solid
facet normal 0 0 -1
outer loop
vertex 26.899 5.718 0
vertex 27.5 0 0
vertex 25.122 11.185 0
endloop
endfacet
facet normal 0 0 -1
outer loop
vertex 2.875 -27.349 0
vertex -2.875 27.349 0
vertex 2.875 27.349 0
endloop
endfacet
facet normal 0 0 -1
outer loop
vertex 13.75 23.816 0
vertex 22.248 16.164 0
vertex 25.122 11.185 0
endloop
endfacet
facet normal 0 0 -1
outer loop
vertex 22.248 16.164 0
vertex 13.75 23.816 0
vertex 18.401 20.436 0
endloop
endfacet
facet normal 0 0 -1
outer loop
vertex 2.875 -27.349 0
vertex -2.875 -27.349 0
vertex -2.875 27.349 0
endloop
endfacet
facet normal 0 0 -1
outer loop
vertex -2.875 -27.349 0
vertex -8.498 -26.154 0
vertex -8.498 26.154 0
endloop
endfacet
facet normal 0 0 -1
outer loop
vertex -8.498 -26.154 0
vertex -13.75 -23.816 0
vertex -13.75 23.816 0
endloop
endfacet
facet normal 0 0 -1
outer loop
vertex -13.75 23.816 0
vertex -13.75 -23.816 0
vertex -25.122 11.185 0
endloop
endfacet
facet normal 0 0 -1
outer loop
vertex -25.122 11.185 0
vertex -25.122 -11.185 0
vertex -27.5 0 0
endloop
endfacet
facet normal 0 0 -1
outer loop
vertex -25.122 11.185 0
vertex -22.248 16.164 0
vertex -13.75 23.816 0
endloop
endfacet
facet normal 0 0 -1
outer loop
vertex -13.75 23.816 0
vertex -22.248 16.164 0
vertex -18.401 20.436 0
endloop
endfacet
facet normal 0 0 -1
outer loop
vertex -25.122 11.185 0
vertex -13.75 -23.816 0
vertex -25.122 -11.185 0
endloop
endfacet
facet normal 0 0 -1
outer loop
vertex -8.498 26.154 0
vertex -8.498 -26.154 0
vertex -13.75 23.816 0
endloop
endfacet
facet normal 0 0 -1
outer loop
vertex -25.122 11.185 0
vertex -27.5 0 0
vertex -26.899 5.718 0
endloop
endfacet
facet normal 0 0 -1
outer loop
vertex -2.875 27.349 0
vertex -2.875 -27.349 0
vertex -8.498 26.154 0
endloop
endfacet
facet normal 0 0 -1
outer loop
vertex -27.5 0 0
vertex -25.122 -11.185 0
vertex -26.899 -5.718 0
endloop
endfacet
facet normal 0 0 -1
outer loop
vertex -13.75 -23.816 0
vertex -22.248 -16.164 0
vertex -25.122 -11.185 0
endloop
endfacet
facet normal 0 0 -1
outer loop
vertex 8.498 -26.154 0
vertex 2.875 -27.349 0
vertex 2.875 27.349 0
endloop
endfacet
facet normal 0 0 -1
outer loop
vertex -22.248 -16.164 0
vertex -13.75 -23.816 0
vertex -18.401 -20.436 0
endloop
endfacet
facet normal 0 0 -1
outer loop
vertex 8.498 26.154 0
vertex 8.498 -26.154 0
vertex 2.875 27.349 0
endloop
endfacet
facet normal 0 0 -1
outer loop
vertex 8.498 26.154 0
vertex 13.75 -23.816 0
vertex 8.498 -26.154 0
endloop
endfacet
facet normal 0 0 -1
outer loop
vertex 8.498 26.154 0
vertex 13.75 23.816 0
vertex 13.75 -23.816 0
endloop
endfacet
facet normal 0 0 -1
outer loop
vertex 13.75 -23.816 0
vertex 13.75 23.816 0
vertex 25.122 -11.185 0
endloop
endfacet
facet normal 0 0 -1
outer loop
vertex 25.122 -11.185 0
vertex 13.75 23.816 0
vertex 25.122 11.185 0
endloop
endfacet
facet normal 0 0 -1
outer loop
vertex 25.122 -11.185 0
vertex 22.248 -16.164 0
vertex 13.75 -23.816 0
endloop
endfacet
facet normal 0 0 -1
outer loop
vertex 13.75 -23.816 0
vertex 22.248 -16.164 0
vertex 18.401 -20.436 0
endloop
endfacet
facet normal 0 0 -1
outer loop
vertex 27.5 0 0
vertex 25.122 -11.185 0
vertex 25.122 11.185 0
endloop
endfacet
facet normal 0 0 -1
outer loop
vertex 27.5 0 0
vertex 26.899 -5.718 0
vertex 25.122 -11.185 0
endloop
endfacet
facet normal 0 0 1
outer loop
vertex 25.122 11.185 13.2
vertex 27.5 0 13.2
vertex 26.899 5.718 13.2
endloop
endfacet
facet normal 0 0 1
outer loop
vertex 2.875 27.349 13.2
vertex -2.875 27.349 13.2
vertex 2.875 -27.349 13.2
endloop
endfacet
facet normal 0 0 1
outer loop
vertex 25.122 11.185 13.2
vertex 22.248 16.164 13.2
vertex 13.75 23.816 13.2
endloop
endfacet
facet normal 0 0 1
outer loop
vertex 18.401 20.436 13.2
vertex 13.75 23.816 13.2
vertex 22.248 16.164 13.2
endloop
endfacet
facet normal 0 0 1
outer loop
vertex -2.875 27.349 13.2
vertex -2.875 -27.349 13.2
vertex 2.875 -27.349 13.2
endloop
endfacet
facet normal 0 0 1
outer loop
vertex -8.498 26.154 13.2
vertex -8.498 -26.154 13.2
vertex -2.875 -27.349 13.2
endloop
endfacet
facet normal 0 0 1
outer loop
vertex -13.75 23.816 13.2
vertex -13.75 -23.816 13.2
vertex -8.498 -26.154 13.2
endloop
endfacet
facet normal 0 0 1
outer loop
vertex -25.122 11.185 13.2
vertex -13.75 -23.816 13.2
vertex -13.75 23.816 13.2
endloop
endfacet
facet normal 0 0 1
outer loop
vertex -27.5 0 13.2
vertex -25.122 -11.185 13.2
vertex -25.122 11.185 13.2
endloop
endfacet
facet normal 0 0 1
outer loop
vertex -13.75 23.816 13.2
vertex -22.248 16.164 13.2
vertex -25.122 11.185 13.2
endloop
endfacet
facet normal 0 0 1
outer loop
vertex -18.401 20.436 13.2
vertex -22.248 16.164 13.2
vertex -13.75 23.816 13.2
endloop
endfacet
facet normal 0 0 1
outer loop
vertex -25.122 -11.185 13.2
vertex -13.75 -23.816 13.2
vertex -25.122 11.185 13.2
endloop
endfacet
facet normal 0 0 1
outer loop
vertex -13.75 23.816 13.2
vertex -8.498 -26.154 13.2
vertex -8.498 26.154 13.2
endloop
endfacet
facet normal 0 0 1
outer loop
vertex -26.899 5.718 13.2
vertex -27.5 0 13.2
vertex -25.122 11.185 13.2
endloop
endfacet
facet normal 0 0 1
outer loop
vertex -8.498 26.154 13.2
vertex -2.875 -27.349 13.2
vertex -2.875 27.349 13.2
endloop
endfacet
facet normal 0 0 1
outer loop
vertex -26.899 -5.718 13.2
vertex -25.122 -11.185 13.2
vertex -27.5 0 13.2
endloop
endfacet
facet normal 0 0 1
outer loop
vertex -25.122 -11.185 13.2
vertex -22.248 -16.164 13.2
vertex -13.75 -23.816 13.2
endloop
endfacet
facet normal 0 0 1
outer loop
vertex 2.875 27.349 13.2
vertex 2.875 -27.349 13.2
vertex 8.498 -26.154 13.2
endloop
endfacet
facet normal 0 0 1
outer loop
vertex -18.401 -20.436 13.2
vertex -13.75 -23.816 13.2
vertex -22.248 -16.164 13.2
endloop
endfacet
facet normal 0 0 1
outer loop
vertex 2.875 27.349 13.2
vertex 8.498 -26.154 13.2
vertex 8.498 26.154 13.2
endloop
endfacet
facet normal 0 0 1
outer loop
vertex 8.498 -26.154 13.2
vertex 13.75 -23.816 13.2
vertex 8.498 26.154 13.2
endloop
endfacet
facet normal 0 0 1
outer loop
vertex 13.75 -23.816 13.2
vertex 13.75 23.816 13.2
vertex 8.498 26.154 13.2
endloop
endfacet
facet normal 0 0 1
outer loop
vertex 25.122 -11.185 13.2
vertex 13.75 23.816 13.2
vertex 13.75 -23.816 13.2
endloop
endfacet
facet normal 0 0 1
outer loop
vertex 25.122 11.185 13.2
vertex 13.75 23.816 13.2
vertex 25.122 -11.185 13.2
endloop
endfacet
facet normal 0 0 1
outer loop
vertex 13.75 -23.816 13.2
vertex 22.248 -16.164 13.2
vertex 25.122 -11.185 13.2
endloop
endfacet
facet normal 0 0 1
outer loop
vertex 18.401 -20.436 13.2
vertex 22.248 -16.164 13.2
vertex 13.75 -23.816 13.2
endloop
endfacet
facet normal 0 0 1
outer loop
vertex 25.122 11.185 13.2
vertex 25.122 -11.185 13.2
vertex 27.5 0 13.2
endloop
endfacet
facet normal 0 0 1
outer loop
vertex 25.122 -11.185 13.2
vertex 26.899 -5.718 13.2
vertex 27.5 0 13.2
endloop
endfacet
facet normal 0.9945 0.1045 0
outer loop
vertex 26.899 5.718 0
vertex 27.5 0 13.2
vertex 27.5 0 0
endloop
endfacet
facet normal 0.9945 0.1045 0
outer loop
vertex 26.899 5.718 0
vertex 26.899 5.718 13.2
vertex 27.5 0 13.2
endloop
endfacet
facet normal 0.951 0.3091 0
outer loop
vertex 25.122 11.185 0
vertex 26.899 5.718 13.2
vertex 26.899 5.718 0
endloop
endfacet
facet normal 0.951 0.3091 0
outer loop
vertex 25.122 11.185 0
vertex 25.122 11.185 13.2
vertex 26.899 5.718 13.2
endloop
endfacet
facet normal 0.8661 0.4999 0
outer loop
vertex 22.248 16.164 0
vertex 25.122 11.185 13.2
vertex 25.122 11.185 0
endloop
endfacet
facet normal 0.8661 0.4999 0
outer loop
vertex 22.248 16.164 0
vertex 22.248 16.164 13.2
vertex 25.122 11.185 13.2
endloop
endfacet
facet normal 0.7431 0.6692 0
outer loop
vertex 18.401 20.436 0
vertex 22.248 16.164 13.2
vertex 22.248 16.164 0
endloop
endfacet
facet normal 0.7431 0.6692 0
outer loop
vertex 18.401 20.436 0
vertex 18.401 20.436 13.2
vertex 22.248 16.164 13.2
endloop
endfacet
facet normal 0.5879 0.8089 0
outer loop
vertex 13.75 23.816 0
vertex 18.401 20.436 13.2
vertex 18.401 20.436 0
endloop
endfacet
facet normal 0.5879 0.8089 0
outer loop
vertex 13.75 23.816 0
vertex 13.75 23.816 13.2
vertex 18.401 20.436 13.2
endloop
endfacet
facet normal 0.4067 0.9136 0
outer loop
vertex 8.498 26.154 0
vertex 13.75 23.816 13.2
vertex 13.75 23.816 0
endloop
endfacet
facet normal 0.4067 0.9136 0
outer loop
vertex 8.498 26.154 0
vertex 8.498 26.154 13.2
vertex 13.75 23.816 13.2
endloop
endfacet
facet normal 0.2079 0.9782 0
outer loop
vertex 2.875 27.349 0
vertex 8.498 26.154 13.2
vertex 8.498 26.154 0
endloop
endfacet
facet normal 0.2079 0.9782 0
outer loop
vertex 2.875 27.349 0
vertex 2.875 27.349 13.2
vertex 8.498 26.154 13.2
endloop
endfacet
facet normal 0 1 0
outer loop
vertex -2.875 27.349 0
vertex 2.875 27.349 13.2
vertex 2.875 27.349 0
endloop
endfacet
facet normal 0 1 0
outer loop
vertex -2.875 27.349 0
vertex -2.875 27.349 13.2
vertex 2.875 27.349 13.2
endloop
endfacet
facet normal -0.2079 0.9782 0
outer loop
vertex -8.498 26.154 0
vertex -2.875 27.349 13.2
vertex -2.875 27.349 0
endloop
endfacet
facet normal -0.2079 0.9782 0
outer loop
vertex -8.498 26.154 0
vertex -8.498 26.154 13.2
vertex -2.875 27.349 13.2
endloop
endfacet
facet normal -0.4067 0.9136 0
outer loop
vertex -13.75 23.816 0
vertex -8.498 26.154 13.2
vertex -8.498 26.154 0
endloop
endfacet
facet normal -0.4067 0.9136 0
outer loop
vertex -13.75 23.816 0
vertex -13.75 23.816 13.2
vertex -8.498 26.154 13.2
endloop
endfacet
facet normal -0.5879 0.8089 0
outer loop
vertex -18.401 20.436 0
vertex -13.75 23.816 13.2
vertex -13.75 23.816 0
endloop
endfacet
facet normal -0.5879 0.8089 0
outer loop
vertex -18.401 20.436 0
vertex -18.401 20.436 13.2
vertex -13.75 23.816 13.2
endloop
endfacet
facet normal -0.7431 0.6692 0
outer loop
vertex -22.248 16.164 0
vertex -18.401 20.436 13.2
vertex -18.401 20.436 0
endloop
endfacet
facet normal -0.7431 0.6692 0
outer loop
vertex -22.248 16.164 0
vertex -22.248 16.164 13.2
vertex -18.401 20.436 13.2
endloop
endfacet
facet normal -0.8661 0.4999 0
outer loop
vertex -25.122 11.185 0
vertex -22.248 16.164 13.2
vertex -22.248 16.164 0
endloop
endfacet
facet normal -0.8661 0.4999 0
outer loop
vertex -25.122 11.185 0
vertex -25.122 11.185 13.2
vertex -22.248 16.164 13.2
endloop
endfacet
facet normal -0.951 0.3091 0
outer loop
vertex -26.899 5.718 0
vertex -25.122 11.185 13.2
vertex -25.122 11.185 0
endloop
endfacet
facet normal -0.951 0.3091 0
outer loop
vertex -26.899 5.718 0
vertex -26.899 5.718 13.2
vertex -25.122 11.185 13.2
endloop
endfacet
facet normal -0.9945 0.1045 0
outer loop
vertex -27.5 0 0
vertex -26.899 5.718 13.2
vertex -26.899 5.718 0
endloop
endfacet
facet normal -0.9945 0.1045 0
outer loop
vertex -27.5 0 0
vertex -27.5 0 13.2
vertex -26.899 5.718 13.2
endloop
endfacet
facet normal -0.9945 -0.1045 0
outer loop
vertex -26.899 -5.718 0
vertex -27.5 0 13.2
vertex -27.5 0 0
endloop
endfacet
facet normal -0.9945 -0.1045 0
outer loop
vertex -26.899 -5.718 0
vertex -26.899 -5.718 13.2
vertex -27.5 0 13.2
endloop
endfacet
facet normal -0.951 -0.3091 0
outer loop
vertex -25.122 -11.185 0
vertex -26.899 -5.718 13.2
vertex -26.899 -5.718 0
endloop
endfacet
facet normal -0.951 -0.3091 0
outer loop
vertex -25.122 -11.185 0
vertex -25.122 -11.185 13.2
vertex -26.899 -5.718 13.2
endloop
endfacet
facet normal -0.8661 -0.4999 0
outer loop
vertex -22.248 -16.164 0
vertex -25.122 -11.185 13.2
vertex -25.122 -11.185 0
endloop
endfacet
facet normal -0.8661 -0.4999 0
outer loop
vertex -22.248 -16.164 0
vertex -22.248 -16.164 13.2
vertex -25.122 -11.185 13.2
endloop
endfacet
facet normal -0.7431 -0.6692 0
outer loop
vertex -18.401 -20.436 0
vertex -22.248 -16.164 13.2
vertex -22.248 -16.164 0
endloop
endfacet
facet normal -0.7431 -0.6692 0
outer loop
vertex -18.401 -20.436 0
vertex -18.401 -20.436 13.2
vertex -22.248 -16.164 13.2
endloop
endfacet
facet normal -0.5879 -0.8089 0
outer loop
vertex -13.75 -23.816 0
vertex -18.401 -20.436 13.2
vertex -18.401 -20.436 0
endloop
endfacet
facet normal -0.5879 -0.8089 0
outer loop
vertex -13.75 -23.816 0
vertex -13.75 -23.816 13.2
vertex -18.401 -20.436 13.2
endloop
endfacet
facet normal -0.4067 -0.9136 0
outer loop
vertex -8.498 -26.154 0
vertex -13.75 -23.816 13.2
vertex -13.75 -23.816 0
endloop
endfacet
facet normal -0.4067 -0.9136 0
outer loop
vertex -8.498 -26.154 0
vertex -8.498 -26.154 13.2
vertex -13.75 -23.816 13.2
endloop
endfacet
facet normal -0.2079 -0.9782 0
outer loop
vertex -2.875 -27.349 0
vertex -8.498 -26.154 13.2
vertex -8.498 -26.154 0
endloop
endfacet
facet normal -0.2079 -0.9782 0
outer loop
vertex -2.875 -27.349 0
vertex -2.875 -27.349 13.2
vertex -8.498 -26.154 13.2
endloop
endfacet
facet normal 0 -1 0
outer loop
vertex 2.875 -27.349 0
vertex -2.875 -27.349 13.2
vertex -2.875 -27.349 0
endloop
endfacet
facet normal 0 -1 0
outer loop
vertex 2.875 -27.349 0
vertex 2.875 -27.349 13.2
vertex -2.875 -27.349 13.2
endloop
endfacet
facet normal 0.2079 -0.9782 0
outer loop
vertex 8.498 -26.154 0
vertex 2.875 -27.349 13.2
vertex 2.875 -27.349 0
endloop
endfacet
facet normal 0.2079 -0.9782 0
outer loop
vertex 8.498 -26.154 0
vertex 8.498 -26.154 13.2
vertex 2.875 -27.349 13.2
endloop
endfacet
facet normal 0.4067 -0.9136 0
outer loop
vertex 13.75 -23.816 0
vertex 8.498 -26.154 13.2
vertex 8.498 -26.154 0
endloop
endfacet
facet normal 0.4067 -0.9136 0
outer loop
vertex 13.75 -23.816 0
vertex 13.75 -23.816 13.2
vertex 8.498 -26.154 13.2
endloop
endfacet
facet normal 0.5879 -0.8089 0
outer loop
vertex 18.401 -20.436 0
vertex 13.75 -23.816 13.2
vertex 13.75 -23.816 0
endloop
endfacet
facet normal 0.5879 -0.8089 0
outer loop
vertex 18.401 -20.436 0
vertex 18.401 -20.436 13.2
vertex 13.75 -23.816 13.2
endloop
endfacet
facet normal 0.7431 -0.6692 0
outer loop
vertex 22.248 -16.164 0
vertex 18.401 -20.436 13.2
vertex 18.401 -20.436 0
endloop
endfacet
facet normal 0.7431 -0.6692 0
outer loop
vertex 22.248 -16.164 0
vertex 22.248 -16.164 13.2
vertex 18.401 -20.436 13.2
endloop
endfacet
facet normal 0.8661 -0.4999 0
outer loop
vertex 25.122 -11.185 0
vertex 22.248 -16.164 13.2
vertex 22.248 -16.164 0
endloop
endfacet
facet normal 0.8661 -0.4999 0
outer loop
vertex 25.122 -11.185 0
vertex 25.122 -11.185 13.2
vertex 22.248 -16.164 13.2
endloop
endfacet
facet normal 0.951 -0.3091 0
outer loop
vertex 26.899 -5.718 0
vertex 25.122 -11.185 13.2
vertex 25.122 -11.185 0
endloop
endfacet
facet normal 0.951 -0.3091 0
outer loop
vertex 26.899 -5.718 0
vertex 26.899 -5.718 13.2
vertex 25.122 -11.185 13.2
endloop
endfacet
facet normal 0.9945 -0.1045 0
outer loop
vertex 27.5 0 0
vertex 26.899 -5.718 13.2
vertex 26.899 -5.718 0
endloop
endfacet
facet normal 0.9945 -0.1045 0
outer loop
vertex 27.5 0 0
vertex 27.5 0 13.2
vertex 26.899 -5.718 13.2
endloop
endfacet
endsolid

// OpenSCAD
//Created by Ari M. Diacou, June 2015
//Shared under Creative Commons License: Attribution 3.0 Unported (CC BY-SA 3.0) 
//see http://creativecommons.org/licenses/by-sa/3.0/

/* [Base] */
//How many blocks form a circle?
blocks_per_rev=12;
//Number of layers of blocks in the turret base
blocks_high=3;
//The height of each block in mm
block_height=4;
//The radial width of a block in mm
block_thickness=10;
//The width of the turret in mm
turret_diameter=60;
//How far the mortar extends from the inside of the blocks in units of block thickness. Range 0-1.
mortar_thickness=.5;
//The type of block being used
stone_type="rough";//["rough","smooth"]
//<1 Compresses layers, >1 expands them to show mortar
z_spacing=1.1;
//<1 Compresses layers, >1 expands them to show mortar
theta_expansion=.95;

/* [Rough Stone Options] */
//A way to save your "random" arrangement
master_seed=1;
//Number of intersections forming a block
n=8;
//reduces the ablity of higher n to cut away all the block, I like -0.4.
power=-.4; //[-1,-0.9,-0.8,-0.7,-0.6,-0.5,-0.4,-0.3,-0.2,-0.1,0]
//Maximum angle of block intersections
max_angle=20;

/* [Smooth Stone Options] */
//How much curviness do you want?
$fn=30;
//The radius of curvature of the corners of smooth blocks
curvature=1;

/* [Hidden] */
////////////// Derived Parameters //////////////////////
stone="silver";
grout="ghostwhite";
num=blocks_per_rev;
turret_radius=turret_diameter/2-block_thickness;
rad=turret_radius;           
/////////////////// Main() /////////////////////////////
if(stone_type=="smooth")    
    color(stone) smooth_base();
else
    color(stone) rough_base();
color(grout) mortar(turret_radius,mortar_thickness);
///////////////// Functions ////////////////////////////
module smooth_base(){
	for(h=[0:blocks_high-1]){ //For loop going up
		rotate([0,0,90*(pow(-1,h))/num]) 
			translate([0,0,(h+.5)*block_height*z_spacing]) 
				union(){
					for(i=[1:num]){ //For loop going around
					   rotate( i * 360 / num, [0,0,1])	
							smooth_wedge(turret_radius,block_thickness,360*theta_expansion/num,block_height,curvature);
						}
					}
		}
	}
module rough_base(){
	for(h=[0:blocks_high-1]){
		rotate([0,0,90*(pow(-1,h))/num]) 
			translate([0,0,(h+.5)*block_height*z_spacing]) 
				union(){
					for(i=[1:num]){
					   rotate( i * 360 / num, [0,0,1])	
							scale([1,1,.5]) 
                                rough_wedge(turret_radius,block_thickness,360*theta_expansion/num,block_height,master_seed+i+num*h);
						}
					}
		}
	}    
module mortar(radius,thickness){
	//Makes a filled cylinder in the middle of the bricks of the 
    inner_radius=radius+(1-thickness)*block_thickness/2;
	outer_radius=thickness*block_thickness;
	//translate([0,0,-block_height])
	linear_extrude(blocks_high*block_height*(z_spacing)){
		circle(inner_radius+outer_radius);
		}
	}
module rough_wedge(inner,width,theta,thickness,seed){
	//inner		=inner radius of arch/circle
	//width		=radial distance of block
	//theta		=angle subtended by block
	//thickness	=height of block
	random=rands(-1,1,n*3,seed);
	intersection(){
		wedge_boundary(inner,width,theta,thickness);
		correct(inner, width)	translate([inner+width/2,0,0])
			intersection_for(i=[0:n-1]){
				rotate([	max_angle*random[3*i]*pow(i*(thickness/inner),power),
							.7*max_angle*random[3*i+1]*pow(i,power),
							max_angle*random[3*i+2]*pow(i*(inner/width),power)])
					cube([width, sqrt((4*inner*tan(theta/2))*(width)), sqrt((4*inner*tan(theta/2))*(thickness))], center=true);
				}
		}	
	}
module correct(inner, width){
	//mirrors an object about its yz plane, which necessarily must be done is this ugly way
	translate([inner+width/2,0,0])
		mirror([1,0,0])
			translate([-inner-width/2,0,0])
				children(0);
	}
module wedge_boundary(inner,width,theta,thickness){
	//Creates a pie slice of theta degrees that has a radius of inner+width. Used to make sure that the wedge does not over-extend the angle it is supposed to.
	intersection(){
		rotate([0,0,-theta/2]) 
			translate([(inner+width)/2,(inner+width)/2,0])
				cube([inner+width,inner+width,2*thickness],center=true);
		rotate([0,0,theta/2]) 
			translate([(inner+width)/2,-(inner+width)/2,0])
				cube([inner+width,inner+width,2*thickness],center=true);
		}
	}
module smooth_wedge(inner,width,theta,thickness,curvature){
	//inner		=inner radius of arch
	//width		=width of block
	//theta		=angle subtended by block
	//thickness	=thickness of block
	//curvature	=roundedness of corners, should be less than all of: thickness, width and inner*sin(theta/2)
	//The block is made by a hull around 8 spheres. This function could be created with a minkowski combination of a sphere and a polyhedron, but the rendering time was horrific. It creates a wedge shaped block on the x axis which extends thickness/2 in each of the z-axis directions, and +theta degrees in the xy-plane
	outer=inner+width;
	r=curvature;
	
	
	//     A---------------D     ---
	//      \-------------/      /
	//       \-----------/      } Width
	//        \---------/      /
	//         B-------C --- ---
	//          \theta/  /
    //           \   /  } Inner (radius)
    //            \ /  /
    //             O ---

	//Angles describing the spheres positions must be recalculated so that the objects fit inside the angle called. Positions are translated to cartesian from cylindrical coorinates (r,theta,z). Because the inner spheres B and C subtend more angle, they requrire a different correction angle than outer spheres A and D.
	phi_o=atan(r/(outer-r));
	phi_i=atan(r/(inner+r));

	h=thickness-2*r;
	H=[0,0,h];

	//The principle vectors that define the centers of the spheres
	A=[(outer-r)*cos(theta-phi_o), (outer-r)*sin(theta-phi_o),0]+H/2;
	B=[(inner+r)*cos(theta-phi_i), (inner+r)*sin(theta-phi_i),0]+H/2;
	C=[(inner+r)*cos(phi_i), (inner+r)*sin(phi_i),0]+H/2;
	D=[(outer-r)*cos(phi_o), (outer-r)*sin(phi_o),0]+H/2;

	//The complementary vectors which are below the z axis
	Ac=A-H;
	Bc=B-H;
	Cc=C-H;
	Dc=D-H;
	hull(){
		//The spheres which round the corners, notice the calling of translation vectors above
		translate(A) sphere(r,center=true);
		translate(B) sphere(r,center=true);
		translate(C) sphere(r,center=true);
		translate(D) sphere(r,center=true);
		translate(Ac) sphere(r,center=true);
		translate(Bc) sphere(r,center=true);
		translate(Cc) sphere(r,center=true);
		translate(Dc) sphere(r,center=true);
		}
	}
